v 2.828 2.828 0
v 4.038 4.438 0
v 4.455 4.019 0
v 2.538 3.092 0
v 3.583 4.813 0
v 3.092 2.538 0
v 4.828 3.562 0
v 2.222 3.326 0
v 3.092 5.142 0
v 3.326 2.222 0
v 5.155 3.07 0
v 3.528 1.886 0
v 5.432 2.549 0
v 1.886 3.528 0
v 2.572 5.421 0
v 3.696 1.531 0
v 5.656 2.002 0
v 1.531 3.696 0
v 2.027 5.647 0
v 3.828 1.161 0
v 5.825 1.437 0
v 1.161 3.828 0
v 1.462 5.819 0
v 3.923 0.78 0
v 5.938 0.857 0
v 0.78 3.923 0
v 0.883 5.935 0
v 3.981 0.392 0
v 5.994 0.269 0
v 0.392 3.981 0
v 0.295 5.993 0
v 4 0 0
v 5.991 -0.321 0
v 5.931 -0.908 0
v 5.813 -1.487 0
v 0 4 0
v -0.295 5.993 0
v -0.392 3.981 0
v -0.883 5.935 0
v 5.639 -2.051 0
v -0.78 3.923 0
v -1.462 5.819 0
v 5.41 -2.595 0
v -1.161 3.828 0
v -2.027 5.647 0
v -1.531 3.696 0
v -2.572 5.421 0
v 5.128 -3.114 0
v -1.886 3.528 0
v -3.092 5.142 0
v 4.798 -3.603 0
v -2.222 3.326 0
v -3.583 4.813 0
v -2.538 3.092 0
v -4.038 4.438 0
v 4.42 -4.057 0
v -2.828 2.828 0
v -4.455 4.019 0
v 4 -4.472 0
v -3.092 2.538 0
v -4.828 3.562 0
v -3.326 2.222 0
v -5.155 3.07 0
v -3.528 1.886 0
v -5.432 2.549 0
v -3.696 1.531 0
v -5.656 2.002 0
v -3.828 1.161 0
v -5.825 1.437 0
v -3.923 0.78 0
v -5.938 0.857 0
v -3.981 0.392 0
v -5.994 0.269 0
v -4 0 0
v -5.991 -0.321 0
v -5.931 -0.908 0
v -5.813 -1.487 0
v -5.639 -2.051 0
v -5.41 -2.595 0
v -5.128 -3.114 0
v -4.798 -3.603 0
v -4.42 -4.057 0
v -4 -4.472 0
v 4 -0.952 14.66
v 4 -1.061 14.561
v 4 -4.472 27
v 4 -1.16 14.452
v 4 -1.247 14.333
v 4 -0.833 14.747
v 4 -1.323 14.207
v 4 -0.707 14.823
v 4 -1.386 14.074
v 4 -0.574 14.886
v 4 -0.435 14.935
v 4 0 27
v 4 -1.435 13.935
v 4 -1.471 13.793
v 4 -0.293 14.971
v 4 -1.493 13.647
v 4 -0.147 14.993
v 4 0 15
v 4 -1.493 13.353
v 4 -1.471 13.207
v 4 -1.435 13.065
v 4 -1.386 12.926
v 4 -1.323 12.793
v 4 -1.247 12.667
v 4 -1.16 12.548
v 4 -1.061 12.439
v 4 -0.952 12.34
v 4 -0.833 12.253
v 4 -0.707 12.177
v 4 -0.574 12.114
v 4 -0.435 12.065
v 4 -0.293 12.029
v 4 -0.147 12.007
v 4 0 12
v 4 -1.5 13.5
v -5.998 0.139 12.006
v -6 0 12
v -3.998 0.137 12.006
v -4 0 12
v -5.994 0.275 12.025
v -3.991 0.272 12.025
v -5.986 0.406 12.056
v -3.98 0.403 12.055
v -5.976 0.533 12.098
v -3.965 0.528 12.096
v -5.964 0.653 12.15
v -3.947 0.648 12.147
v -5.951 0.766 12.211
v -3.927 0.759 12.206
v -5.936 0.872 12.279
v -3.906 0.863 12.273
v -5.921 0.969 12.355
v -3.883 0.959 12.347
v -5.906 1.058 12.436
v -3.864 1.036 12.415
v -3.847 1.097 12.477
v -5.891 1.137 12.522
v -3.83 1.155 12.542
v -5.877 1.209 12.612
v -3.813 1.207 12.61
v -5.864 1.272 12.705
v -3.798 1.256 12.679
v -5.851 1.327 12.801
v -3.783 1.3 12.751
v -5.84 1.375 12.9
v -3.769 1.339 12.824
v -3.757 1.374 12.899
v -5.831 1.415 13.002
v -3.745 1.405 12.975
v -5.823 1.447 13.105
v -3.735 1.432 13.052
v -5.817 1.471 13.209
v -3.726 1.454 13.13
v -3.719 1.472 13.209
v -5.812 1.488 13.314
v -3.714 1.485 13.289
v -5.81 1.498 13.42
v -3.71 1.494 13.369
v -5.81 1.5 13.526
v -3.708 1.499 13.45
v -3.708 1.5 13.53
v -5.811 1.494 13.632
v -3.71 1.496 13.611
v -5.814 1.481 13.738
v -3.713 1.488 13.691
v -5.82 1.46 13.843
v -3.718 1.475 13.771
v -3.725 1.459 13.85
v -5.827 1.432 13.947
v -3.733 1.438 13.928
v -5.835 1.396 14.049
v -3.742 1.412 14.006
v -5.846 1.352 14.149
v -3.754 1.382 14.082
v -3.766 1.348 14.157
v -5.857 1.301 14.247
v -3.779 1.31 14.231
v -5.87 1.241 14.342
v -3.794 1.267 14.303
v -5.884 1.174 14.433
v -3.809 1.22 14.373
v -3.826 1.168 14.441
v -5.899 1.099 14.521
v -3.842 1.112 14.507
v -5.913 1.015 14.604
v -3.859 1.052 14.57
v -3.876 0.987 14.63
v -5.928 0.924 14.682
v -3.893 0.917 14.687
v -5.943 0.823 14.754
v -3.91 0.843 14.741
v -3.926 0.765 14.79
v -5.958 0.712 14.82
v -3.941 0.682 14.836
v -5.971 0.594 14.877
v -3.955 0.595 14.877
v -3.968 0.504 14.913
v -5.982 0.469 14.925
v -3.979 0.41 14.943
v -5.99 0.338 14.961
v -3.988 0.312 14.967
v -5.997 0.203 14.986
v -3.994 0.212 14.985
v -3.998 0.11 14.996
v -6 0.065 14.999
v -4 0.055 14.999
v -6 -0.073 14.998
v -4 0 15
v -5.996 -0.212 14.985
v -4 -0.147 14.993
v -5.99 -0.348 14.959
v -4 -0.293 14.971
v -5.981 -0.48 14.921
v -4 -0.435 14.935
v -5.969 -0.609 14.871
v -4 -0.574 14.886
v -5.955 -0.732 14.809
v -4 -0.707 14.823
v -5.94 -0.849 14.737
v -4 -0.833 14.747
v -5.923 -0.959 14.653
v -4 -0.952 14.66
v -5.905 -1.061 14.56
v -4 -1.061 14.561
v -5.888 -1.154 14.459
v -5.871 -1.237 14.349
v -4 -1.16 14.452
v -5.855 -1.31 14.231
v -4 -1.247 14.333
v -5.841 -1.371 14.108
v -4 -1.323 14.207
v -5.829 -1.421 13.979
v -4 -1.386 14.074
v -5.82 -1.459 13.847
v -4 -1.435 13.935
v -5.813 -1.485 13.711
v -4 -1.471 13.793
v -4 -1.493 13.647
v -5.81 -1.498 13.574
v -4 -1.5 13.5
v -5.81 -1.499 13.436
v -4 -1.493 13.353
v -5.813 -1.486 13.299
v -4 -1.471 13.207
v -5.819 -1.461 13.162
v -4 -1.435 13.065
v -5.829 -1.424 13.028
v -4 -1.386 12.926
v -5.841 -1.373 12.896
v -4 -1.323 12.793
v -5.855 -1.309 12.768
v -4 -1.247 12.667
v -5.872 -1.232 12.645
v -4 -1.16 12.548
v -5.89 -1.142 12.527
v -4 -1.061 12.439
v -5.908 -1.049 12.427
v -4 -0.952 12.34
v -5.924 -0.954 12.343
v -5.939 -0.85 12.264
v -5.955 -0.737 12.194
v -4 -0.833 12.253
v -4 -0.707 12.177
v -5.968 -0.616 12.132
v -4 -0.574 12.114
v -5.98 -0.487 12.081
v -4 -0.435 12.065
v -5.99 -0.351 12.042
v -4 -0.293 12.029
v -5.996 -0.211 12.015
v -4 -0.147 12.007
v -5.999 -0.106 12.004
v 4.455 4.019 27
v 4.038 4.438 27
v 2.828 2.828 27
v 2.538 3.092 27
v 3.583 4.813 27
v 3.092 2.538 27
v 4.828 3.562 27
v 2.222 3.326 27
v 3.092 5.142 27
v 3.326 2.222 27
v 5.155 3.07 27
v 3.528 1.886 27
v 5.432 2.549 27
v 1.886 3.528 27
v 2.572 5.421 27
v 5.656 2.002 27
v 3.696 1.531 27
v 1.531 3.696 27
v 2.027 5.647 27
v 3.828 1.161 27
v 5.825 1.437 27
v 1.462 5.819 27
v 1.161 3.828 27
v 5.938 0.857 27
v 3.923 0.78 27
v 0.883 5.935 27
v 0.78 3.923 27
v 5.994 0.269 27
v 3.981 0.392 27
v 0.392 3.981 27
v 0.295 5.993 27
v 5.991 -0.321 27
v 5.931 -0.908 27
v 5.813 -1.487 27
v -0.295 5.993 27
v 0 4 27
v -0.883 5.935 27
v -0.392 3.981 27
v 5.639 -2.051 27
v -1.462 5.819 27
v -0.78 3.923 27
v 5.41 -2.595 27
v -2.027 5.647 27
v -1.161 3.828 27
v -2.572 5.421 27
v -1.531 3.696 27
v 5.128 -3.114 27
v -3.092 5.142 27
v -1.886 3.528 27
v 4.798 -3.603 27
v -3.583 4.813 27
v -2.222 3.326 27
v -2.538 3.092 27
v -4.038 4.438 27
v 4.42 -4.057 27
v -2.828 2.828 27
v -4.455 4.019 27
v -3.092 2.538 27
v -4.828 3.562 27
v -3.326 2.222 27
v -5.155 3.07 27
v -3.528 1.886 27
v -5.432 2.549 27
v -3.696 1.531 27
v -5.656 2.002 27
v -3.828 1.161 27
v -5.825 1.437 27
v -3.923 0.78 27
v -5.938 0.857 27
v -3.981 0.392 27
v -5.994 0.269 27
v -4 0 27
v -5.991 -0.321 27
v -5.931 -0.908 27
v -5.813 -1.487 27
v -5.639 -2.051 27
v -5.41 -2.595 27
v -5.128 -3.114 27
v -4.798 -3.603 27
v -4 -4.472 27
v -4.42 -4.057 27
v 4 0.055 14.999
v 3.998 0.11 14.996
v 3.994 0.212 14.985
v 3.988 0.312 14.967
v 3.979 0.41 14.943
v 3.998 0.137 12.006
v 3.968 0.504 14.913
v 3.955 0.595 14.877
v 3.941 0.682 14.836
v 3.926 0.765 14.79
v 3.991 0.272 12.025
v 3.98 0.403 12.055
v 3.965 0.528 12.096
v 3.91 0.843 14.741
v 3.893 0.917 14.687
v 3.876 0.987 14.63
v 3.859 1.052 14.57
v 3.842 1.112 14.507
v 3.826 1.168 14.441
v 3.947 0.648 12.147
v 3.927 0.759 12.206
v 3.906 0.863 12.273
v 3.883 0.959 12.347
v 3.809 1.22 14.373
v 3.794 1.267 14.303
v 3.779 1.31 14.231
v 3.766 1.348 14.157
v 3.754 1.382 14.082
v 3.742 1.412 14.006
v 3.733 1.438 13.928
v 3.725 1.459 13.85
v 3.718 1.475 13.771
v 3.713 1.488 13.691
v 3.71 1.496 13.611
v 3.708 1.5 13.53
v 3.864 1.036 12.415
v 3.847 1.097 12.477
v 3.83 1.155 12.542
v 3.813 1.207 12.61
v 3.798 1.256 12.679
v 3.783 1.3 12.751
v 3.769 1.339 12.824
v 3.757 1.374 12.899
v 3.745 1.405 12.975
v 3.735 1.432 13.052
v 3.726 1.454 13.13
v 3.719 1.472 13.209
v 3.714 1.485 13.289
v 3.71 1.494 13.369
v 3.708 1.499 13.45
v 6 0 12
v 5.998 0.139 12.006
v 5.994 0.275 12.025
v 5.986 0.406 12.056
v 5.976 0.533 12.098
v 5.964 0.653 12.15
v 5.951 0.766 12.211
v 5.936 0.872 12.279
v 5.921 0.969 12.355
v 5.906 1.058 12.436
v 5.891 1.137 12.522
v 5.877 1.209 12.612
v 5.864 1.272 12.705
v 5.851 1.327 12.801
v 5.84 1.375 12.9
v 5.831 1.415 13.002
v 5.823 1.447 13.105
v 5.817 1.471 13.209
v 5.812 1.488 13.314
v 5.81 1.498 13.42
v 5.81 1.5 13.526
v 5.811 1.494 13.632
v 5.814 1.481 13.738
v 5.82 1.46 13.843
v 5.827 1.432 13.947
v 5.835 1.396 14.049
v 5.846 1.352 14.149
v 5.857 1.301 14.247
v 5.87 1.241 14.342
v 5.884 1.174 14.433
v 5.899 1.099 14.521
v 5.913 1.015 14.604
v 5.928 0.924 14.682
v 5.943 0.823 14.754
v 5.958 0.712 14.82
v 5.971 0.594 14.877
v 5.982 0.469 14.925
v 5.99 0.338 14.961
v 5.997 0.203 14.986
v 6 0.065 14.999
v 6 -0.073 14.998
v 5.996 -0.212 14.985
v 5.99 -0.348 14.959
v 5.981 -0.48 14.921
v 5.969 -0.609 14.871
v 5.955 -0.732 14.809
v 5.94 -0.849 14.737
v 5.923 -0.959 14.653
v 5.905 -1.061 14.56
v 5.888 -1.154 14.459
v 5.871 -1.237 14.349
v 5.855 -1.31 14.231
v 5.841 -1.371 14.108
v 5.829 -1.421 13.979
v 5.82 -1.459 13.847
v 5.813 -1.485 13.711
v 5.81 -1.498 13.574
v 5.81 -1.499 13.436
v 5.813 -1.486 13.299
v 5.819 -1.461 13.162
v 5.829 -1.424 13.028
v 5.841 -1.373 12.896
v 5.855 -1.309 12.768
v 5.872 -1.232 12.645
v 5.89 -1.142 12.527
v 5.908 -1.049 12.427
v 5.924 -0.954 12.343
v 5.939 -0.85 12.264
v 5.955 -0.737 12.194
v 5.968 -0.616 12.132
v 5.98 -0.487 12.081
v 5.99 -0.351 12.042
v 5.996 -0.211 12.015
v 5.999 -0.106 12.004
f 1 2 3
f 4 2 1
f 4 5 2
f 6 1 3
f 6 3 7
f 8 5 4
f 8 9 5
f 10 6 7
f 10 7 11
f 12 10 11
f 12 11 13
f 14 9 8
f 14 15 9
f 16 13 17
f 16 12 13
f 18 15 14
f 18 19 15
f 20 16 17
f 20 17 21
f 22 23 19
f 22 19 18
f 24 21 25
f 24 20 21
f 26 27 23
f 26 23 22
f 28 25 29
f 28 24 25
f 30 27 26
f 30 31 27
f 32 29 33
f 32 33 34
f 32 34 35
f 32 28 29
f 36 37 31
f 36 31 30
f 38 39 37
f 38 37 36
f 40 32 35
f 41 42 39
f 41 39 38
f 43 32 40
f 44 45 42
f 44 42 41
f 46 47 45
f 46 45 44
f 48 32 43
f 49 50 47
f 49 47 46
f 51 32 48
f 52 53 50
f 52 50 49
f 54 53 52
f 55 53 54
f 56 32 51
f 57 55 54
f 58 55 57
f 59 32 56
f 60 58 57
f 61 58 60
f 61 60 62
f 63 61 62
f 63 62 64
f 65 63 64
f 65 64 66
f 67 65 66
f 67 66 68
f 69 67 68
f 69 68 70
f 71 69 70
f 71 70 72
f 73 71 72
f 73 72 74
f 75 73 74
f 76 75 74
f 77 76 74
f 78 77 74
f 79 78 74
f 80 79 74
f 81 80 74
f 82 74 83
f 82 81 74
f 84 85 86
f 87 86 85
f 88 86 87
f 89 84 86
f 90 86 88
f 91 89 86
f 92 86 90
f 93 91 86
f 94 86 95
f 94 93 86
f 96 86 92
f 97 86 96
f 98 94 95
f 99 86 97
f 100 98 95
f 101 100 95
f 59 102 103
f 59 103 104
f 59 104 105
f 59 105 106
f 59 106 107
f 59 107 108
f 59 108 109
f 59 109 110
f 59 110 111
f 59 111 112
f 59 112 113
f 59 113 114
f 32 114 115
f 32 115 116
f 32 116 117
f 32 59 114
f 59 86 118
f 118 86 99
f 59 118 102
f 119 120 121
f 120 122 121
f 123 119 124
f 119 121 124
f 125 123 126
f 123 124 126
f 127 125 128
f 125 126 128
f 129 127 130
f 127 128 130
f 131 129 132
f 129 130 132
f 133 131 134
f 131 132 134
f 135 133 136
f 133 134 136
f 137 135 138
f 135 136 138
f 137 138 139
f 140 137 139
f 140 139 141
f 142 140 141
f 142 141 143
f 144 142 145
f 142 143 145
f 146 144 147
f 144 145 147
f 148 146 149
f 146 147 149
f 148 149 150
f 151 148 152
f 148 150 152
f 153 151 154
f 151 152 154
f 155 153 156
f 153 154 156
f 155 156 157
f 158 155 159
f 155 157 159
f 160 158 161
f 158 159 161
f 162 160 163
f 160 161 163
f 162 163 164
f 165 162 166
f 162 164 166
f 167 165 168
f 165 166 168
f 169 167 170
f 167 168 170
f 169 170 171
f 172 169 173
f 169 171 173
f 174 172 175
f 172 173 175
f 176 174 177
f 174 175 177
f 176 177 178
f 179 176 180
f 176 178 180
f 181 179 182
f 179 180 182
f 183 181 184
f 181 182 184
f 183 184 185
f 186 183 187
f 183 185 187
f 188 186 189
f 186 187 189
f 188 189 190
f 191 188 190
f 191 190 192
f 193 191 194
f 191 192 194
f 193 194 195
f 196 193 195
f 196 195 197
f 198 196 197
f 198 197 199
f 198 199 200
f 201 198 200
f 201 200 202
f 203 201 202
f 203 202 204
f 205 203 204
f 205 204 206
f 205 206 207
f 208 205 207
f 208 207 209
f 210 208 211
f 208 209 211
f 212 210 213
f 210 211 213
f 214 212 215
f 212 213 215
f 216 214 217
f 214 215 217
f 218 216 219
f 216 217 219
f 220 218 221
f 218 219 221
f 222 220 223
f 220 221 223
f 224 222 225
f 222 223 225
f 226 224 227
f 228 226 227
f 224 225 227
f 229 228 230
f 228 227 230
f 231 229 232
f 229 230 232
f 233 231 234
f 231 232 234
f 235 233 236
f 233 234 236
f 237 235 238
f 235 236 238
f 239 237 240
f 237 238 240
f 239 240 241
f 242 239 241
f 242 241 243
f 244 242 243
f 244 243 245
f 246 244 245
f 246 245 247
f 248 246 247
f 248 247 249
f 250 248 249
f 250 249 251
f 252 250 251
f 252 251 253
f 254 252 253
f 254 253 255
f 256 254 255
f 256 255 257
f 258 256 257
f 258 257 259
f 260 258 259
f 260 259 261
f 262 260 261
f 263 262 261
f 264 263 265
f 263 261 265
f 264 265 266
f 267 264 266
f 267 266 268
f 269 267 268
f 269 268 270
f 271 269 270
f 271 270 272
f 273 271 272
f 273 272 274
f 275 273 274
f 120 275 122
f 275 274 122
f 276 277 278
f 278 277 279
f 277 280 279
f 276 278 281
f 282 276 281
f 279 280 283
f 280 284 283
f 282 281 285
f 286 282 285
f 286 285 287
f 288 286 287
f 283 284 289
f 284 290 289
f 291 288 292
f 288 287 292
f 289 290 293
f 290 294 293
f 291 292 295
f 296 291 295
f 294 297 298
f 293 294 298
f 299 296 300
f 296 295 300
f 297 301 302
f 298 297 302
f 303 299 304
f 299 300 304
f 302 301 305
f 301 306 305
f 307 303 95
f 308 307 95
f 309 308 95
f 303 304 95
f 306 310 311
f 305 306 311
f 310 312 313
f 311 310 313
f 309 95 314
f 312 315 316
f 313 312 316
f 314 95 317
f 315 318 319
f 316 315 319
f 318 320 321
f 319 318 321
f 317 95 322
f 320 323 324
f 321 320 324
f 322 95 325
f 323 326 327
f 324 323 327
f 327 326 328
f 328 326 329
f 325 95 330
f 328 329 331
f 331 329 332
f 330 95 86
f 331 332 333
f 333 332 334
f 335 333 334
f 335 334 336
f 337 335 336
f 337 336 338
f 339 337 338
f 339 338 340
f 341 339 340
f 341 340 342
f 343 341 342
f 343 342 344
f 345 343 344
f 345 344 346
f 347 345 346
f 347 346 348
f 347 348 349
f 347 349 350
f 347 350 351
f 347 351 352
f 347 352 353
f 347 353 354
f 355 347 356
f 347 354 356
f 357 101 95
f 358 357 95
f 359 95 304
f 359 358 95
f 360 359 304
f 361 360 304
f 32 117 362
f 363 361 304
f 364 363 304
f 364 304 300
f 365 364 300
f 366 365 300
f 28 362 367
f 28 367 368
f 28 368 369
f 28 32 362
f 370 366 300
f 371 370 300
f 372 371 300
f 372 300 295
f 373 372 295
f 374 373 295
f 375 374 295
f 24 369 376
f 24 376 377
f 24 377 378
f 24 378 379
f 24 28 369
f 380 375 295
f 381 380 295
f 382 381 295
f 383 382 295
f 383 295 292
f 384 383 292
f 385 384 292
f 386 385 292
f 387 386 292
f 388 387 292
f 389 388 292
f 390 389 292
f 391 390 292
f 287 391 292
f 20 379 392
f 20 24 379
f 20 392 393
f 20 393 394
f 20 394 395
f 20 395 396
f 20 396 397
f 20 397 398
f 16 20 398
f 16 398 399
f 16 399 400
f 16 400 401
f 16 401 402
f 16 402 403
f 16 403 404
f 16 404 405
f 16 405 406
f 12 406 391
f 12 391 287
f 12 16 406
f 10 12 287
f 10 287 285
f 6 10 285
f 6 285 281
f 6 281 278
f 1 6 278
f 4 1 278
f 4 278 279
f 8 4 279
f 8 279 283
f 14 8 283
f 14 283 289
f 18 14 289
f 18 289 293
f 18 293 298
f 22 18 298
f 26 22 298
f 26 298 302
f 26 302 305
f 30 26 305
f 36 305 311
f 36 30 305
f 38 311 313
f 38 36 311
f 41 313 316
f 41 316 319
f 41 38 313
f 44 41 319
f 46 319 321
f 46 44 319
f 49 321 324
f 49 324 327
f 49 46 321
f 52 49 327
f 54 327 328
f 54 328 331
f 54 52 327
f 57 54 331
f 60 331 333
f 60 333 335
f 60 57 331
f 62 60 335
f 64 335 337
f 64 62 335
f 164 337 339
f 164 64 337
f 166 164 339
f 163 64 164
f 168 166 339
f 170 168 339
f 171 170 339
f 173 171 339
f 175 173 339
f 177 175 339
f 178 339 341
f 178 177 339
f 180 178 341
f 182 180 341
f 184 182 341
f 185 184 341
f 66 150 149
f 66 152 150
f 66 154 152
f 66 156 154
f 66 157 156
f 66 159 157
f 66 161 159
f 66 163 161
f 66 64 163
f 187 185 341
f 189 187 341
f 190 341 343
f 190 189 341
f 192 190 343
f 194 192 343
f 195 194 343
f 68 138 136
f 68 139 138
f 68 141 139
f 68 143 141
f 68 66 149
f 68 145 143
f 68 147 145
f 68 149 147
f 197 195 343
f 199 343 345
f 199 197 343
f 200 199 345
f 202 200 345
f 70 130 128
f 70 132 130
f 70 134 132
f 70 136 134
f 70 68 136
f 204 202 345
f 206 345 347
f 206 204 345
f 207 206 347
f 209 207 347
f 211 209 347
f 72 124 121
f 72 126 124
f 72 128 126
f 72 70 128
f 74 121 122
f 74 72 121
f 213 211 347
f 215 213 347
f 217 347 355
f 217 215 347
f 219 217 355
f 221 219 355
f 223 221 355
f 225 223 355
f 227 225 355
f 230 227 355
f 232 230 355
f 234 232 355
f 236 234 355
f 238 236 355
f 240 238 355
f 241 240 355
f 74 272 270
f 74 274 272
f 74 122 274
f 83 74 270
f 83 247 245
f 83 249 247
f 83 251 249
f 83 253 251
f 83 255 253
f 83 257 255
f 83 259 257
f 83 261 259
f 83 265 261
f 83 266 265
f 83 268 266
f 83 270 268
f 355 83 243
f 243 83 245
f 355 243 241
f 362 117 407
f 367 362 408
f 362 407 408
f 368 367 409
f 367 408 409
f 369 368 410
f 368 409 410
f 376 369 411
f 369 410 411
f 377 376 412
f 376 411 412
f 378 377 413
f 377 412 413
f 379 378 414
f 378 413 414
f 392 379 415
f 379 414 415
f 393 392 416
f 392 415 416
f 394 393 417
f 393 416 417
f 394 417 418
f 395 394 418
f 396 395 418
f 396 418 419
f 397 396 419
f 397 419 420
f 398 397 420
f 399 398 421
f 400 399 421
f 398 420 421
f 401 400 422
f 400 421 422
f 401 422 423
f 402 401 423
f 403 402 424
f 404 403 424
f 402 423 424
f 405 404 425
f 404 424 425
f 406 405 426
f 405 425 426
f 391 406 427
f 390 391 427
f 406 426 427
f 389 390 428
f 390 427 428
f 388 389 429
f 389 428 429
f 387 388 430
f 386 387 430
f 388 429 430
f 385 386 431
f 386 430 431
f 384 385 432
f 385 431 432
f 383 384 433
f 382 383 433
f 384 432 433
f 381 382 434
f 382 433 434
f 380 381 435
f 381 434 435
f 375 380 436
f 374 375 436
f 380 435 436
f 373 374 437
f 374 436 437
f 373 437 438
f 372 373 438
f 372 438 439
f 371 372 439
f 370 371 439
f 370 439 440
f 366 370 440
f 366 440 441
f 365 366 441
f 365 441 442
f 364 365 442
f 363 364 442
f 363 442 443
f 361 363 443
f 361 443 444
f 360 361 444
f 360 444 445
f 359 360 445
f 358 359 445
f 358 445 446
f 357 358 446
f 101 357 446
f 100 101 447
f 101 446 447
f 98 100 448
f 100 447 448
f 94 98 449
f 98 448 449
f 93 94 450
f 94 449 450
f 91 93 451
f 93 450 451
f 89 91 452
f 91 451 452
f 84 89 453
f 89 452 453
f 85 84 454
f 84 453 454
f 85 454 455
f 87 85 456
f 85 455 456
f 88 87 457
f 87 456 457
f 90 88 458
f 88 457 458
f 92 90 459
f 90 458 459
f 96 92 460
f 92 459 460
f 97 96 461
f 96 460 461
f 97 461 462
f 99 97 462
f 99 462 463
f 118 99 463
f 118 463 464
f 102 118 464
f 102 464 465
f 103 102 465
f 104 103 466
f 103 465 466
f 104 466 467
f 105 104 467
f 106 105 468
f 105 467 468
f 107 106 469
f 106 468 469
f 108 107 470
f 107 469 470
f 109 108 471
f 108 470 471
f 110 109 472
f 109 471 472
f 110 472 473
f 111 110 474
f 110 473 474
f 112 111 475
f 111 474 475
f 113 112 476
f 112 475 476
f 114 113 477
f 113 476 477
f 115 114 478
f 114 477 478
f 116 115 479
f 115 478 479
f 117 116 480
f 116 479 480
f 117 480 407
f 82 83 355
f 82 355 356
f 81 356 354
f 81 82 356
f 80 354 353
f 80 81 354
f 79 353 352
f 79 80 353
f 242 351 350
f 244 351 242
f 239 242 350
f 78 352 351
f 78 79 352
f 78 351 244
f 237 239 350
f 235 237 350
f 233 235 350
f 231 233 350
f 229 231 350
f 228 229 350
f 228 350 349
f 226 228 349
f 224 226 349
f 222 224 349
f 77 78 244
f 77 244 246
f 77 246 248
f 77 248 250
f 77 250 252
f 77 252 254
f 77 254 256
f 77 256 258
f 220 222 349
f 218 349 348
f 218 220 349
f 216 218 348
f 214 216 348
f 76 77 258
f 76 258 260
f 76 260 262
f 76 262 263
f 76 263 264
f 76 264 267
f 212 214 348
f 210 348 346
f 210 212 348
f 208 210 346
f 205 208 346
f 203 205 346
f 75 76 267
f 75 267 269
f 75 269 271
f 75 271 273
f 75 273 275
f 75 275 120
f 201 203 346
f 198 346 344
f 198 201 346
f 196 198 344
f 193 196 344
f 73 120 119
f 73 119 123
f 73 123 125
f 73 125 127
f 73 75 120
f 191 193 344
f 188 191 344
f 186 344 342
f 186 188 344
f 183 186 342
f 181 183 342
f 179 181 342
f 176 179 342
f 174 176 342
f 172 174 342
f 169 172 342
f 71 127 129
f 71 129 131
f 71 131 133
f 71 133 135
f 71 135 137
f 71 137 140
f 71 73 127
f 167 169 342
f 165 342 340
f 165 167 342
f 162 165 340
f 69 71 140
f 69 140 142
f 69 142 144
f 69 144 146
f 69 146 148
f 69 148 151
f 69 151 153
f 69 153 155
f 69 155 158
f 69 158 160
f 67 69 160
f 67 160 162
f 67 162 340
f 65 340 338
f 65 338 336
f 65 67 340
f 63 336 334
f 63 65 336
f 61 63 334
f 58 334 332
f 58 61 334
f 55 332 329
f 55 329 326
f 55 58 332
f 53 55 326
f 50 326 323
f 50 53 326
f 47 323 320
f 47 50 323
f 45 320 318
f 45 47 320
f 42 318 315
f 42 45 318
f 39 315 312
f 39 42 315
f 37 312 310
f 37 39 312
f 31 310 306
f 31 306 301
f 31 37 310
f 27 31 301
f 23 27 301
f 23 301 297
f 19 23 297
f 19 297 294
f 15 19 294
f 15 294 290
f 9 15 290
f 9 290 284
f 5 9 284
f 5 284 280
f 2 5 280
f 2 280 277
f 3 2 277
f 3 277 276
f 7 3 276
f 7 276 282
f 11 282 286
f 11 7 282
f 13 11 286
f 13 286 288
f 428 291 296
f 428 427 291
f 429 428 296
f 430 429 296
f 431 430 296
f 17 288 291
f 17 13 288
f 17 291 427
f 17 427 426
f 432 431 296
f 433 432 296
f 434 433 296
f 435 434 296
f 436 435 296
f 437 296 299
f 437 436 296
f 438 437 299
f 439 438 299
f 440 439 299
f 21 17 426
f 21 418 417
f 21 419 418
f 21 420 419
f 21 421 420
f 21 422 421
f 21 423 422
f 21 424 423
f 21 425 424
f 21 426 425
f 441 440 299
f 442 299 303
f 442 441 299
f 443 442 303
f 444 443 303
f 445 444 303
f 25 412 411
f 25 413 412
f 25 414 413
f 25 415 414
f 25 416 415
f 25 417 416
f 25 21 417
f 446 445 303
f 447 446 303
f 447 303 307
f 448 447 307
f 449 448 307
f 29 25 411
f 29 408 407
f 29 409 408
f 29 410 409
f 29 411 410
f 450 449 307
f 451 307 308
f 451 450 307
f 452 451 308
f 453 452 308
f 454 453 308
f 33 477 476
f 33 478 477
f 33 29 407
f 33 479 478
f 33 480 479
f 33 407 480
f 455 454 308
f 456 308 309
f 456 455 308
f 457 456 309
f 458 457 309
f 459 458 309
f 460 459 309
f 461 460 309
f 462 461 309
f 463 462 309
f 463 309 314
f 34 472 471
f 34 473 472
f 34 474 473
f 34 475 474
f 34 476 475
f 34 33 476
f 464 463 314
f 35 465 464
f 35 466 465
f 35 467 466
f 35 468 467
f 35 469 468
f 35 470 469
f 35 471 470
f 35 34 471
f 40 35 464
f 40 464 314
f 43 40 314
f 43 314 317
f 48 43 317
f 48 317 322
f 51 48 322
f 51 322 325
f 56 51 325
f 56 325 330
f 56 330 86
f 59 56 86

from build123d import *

# Parameters (mm, degrees)
SALIENTE_EXTRUIR1_DEPTH = 27
CROQUIS2_R              = 1.5
CORTAR_EXTRUIR1_DEPTH   = 13.5


with BuildPart() as part:
    # Croquis1 → Saliente-Extruir1 (new body)
    with BuildSketch(Plane(origin=(0, 0, 0), x_dir=(0, 1, 0), z_dir=(0, 0, 1))):
        with BuildLine():
            Line((0, 4), (-4.472135955, 4))
            ThreePointArc((-4.472135955, 4), (6, 0), (-4.472135955, -4))
            Line((-4.472135955, -4), (0, -4))
            ThreePointArc((0, -4), (4, 0), (0, 4))
        make_face()
    extrude(amount=SALIENTE_EXTRUIR1_DEPTH)

    # Croquis2 → Cortar-Extruir1 (cut, symmetric)
    with BuildSketch(Plane.YZ):
        with Locations(Location((0, 13.5, 0), (0, 0, 270))):
            Circle(CROQUIS2_R)
    extrude(amount=CORTAR_EXTRUIR1_DEPTH, both=True, mode=Mode.SUBTRACT)


solid = part.part
